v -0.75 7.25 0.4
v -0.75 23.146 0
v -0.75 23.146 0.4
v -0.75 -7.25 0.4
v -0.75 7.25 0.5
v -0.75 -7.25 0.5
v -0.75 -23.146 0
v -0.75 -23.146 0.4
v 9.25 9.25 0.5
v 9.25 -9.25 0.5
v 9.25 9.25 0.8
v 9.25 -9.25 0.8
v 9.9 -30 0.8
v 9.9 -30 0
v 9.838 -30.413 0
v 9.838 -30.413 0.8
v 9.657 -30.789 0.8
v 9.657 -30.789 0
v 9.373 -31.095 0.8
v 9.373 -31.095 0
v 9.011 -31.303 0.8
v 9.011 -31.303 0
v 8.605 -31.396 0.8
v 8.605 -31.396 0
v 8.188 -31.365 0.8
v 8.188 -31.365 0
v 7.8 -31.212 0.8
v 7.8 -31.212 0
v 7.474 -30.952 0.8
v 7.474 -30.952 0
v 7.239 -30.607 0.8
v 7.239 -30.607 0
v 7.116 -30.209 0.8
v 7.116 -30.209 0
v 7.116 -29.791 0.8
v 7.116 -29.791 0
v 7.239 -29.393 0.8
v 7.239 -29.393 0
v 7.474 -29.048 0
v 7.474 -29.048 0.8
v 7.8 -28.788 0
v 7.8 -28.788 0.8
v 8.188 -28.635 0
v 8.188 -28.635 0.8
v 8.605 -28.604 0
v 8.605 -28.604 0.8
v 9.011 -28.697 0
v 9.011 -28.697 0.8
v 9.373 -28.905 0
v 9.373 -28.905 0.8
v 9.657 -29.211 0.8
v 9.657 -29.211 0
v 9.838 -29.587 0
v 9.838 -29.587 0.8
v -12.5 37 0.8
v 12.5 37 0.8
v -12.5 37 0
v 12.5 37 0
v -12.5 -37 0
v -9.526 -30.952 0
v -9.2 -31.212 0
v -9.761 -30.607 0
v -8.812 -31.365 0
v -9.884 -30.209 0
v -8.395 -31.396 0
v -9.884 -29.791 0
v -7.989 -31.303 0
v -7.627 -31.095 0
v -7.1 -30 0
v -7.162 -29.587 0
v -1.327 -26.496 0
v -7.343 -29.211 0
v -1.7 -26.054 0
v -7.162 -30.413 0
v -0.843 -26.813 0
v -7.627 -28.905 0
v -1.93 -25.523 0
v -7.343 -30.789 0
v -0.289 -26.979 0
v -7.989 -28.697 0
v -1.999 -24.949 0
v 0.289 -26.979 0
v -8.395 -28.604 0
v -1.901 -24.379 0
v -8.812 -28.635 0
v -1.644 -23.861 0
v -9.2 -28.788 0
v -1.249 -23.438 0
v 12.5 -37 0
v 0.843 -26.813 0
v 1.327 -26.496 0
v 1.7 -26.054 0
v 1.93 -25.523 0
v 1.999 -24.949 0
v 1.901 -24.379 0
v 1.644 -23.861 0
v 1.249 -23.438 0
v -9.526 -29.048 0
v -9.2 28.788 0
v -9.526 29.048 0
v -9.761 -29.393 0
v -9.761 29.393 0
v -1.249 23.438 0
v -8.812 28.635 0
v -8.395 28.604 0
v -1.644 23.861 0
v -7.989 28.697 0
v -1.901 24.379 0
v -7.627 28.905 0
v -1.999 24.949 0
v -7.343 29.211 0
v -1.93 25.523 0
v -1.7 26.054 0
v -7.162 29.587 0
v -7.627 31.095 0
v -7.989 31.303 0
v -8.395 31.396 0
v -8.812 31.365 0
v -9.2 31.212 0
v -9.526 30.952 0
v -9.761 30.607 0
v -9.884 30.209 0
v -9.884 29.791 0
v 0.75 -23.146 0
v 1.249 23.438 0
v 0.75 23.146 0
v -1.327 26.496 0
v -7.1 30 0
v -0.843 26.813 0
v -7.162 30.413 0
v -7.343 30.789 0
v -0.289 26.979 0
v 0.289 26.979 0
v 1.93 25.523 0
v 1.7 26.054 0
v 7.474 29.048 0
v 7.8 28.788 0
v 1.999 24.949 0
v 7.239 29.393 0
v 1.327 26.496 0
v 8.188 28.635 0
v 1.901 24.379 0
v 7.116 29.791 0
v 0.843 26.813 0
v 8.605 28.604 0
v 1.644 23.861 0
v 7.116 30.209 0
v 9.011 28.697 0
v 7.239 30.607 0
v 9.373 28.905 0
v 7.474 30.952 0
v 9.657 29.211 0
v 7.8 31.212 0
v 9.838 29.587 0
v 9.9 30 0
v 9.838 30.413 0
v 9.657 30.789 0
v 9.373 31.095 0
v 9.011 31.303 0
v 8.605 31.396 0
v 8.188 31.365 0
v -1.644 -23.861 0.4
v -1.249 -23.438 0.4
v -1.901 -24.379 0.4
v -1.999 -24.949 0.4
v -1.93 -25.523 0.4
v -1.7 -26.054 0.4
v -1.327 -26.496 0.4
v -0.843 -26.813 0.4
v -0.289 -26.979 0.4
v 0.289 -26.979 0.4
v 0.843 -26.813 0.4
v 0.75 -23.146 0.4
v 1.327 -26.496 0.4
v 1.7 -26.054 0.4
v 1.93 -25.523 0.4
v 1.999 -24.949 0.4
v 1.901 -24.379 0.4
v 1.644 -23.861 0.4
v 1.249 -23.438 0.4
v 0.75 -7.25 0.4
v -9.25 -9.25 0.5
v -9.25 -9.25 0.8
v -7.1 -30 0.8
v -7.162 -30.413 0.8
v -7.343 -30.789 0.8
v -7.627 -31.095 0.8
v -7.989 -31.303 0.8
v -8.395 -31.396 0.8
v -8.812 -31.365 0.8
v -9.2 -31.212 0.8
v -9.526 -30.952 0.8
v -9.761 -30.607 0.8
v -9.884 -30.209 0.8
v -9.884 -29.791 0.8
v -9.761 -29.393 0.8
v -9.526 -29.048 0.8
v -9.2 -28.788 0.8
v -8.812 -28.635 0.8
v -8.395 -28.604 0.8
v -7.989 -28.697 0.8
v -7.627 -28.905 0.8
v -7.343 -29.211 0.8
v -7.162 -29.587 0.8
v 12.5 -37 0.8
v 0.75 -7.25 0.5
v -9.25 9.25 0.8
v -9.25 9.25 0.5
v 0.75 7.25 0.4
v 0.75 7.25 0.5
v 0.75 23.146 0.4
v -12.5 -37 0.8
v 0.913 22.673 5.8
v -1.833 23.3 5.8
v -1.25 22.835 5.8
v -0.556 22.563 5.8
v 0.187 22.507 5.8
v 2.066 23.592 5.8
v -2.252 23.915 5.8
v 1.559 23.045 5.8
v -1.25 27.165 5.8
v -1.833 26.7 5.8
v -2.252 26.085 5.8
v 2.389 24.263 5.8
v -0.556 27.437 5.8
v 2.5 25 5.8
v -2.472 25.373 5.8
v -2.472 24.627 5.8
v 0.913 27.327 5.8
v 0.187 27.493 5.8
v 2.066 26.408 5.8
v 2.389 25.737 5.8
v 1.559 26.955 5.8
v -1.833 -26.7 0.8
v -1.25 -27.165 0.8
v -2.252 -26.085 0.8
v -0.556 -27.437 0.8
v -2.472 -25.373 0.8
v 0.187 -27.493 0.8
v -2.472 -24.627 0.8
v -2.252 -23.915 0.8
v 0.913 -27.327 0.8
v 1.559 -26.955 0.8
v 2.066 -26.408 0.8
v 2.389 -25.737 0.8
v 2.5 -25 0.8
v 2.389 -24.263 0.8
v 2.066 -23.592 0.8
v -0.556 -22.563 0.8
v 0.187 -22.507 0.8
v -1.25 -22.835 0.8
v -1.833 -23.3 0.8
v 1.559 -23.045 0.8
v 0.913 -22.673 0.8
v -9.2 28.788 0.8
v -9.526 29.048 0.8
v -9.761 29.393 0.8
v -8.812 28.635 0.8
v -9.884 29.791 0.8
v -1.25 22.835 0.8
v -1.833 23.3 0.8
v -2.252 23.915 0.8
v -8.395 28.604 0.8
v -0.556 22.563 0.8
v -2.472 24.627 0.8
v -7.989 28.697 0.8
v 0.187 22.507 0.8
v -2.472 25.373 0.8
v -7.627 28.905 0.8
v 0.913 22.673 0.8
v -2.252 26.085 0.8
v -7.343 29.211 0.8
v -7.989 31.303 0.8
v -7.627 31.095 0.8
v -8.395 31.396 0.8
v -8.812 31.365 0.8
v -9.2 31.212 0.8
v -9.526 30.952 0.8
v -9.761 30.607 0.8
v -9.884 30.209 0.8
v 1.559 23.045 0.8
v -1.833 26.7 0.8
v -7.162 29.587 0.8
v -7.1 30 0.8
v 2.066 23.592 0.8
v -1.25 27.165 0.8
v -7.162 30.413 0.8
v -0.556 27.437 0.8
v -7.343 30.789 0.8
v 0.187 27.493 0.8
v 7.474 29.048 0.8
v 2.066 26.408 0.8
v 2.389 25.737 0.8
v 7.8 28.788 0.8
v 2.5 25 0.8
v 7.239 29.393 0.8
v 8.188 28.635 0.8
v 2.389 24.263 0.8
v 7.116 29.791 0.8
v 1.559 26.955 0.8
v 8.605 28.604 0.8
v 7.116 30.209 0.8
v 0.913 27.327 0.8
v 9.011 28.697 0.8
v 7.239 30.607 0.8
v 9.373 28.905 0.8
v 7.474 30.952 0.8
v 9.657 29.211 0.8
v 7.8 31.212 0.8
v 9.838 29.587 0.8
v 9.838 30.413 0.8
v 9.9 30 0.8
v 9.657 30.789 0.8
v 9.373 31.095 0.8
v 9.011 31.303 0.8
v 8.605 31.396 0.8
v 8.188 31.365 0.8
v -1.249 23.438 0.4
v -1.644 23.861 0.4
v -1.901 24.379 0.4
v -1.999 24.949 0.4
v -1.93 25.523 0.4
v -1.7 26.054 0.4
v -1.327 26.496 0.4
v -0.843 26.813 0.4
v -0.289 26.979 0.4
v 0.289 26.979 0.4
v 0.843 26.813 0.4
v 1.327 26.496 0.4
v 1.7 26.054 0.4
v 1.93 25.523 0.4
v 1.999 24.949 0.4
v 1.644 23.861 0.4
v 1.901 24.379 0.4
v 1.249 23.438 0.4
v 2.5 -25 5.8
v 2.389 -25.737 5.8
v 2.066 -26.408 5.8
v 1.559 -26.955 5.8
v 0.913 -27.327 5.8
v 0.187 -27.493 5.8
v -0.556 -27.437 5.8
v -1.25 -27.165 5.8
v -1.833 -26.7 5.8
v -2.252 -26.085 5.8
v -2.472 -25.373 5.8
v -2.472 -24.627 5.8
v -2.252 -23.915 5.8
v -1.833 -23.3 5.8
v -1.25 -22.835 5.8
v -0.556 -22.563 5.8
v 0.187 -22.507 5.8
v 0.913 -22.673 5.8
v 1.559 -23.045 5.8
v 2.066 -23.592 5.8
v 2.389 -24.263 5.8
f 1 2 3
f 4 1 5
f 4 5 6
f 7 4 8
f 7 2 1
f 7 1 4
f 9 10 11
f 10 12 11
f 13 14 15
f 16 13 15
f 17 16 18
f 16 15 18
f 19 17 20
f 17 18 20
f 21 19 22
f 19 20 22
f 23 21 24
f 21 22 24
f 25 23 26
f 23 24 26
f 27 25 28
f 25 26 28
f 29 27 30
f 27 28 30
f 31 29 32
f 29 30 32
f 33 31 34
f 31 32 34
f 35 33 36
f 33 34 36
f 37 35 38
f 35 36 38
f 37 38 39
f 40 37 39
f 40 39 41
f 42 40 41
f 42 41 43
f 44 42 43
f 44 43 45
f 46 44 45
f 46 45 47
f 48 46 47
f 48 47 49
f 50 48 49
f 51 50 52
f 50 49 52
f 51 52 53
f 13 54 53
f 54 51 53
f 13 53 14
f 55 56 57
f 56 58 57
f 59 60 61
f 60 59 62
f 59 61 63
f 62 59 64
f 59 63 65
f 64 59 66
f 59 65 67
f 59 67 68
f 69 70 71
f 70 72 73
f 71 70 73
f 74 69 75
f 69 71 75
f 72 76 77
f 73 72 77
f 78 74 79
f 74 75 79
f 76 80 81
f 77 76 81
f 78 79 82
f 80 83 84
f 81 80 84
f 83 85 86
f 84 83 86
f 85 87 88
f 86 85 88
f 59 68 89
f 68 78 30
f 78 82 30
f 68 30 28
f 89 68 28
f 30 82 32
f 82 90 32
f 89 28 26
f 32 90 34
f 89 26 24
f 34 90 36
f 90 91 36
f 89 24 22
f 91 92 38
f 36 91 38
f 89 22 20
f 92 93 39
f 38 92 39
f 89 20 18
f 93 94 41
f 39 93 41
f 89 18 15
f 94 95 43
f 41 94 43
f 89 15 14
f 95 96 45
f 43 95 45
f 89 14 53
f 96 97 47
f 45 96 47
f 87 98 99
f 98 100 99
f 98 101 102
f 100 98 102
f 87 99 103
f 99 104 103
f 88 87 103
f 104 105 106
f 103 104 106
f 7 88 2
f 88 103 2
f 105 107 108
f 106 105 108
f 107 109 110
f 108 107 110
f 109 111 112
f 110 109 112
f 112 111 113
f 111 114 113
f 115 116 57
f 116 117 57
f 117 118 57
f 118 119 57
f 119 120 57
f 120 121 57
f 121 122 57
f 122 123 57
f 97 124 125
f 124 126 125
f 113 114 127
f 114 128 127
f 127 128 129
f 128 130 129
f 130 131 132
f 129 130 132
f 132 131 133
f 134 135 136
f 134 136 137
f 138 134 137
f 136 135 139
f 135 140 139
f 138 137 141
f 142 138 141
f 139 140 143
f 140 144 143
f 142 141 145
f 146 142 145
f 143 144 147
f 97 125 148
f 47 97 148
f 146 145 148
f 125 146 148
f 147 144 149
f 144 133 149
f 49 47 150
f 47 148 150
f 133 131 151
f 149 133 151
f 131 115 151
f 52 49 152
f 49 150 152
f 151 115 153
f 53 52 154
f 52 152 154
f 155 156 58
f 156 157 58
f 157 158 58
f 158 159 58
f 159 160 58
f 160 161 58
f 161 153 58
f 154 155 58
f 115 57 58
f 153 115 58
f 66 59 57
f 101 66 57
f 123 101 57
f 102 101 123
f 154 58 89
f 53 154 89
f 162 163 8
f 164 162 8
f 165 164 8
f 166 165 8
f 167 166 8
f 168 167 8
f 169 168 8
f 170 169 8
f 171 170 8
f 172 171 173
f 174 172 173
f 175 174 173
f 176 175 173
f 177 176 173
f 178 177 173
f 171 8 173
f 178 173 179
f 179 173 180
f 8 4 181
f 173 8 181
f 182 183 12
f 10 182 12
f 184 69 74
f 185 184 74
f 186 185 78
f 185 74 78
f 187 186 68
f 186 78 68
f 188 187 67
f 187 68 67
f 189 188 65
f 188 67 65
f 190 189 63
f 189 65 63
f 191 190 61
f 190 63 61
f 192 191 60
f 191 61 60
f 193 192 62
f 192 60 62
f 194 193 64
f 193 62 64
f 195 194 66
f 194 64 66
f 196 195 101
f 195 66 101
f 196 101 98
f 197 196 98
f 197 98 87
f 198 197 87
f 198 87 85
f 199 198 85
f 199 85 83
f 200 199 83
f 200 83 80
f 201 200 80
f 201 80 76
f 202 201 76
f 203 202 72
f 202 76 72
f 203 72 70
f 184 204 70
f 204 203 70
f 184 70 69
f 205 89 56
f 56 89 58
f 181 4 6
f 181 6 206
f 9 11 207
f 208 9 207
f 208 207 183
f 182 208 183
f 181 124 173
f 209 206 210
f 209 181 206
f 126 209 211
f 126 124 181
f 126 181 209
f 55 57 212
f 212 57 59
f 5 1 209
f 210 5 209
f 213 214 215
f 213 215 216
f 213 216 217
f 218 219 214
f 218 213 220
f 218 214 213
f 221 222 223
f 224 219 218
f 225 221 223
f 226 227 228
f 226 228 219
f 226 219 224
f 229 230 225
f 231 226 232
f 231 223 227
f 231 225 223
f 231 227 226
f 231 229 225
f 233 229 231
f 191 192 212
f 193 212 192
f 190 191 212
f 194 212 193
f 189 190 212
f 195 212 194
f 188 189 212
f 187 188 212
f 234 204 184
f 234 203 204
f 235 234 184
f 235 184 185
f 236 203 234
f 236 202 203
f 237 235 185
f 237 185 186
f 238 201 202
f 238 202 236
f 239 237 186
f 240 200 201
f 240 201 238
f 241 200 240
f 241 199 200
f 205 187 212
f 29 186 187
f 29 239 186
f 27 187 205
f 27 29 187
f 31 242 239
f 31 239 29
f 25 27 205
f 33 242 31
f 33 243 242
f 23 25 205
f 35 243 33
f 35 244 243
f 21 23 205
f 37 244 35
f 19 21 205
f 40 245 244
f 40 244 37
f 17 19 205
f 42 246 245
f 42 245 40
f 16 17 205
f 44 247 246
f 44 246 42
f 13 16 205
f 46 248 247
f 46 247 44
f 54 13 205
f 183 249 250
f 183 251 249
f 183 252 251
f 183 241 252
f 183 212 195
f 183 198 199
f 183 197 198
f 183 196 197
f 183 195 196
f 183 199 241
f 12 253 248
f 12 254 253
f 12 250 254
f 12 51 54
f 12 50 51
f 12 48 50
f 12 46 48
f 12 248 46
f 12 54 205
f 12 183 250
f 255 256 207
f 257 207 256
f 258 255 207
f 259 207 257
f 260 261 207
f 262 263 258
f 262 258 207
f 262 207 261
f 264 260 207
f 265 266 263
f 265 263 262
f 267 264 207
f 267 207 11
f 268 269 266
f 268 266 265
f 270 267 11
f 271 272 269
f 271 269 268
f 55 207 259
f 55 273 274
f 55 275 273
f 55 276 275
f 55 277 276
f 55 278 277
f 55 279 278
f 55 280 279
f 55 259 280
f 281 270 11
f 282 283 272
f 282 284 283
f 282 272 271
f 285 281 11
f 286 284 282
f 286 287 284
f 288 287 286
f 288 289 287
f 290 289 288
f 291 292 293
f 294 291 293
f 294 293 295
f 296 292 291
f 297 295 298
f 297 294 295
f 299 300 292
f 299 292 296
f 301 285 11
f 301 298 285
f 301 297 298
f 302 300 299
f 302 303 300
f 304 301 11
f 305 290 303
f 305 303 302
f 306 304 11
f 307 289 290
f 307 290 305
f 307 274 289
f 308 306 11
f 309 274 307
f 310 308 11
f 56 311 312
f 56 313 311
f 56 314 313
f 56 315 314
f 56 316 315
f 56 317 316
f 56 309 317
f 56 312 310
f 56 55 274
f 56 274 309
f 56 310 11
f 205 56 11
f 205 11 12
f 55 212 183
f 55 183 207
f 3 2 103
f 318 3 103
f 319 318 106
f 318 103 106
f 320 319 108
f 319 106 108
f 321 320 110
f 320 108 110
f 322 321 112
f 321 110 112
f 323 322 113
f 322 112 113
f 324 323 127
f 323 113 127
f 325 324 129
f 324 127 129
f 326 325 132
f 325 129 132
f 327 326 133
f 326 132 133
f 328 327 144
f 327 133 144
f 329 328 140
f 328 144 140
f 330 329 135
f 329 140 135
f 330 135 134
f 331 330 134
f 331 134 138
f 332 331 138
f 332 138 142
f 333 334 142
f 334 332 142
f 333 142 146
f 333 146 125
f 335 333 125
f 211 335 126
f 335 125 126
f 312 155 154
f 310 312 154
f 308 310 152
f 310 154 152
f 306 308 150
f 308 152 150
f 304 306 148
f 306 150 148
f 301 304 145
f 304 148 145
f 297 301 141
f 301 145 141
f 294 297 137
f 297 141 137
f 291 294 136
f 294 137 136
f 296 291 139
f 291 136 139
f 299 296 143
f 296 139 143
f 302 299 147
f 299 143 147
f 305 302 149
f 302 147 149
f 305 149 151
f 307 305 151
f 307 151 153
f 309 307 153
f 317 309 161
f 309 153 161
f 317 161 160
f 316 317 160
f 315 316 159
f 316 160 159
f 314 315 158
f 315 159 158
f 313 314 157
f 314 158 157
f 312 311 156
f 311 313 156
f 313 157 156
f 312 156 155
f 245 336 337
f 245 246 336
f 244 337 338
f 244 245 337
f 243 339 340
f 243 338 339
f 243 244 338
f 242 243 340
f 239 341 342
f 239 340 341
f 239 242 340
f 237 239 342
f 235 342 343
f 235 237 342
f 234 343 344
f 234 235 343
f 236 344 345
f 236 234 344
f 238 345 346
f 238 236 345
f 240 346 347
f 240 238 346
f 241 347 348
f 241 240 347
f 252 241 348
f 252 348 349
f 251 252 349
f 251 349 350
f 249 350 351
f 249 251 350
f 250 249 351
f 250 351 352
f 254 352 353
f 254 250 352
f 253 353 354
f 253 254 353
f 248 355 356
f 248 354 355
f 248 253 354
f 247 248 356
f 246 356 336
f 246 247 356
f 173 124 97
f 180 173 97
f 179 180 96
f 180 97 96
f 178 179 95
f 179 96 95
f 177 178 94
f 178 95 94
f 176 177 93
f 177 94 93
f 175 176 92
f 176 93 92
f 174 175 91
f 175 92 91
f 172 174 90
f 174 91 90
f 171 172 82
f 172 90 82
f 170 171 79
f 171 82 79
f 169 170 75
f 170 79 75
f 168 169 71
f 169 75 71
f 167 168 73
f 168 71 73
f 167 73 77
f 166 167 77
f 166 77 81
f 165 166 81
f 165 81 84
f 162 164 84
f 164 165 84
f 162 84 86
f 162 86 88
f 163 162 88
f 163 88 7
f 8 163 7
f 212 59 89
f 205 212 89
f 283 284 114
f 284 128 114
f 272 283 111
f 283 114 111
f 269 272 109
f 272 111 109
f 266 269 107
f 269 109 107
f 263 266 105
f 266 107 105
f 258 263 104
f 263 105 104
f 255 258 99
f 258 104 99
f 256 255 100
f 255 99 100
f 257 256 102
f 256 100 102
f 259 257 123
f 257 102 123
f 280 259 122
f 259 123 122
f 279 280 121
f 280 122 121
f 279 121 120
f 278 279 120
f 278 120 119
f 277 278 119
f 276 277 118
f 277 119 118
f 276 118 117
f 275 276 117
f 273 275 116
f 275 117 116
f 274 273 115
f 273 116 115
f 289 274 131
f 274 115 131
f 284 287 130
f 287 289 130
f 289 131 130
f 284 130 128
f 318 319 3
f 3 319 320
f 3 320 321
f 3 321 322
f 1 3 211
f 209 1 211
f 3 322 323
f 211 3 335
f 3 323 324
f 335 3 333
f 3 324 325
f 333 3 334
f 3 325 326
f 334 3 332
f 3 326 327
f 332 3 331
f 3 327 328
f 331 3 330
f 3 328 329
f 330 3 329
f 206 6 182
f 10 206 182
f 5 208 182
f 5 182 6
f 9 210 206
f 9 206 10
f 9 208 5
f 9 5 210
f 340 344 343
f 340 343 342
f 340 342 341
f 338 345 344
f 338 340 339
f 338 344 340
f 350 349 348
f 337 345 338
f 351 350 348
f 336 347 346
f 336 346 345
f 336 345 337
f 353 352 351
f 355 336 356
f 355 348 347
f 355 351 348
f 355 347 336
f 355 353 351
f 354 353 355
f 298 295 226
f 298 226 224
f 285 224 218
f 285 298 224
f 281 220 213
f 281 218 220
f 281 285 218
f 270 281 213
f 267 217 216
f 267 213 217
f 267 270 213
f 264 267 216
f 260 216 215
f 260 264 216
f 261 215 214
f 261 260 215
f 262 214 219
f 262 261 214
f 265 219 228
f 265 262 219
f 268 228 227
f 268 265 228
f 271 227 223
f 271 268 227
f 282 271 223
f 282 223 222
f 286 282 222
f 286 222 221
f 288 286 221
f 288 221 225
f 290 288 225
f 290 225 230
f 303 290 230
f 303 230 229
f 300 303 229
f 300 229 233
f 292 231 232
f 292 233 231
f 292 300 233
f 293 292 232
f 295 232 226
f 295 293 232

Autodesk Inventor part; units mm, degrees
ref_plane "YZ Plane" through (0, 0, 0) normal (1, 0, 0) x (0, 1, 0)
ref_plane "XZ Plane" through (0, 0, 0) normal (0, 1, 0) x (-1, 0, 0)
ref_plane "XY Plane" through (0, 0, 0) normal (0, 0, 1) x (1, 0, 0)
ref_plane "Arbeitsebene1" through (0, 0, 0) normal (0, 0, 1) x (1, 0, 0)
sketch "Skizze1" plane through (0, 0, 0) normal (0, 0, 1) x (1, 0, 0)
  line L0 (-12.5, 37) -> (-12.5, -37) projected
  line L1 (-12.5, -37) -> (12.5, -37) projected
  line L2 (12.5, -37) -> (12.5, 37) projected
  line L3 (12.5, 37) -> (-12.5, 37) projected
  circle A0 centre (8.5, 30) radius 1.4 projected
  circle A1 centre (-8.5, 30) radius 1.4 projected
  circle A2 centre (-8.5, -30) radius 1.4 projected
  circle A3 centre (8.5, -30) radius 1.4 projected
  line L4 (9.25, 9.25) -> (9.25, -9.25) projected
  line L5 (9.25, -9.25) -> (-9.25, -9.25) projected
  line L6 (-9.25, -9.25) -> (-9.25, 9.25) projected
  line L7 (-9.25, 9.25) -> (9.25, 9.25) projected
  arc A4 (0.75, 23.146) -> (-0.75, 23.146) centre (0, 25) ccw projected
  line L8 (0.75, -23.146) -> (0.75, 23.146) projected
  arc A5 (-0.75, -23.146) -> (0.75, -23.146) centre (0, -25) ccw projected
  line L9 (-0.75, 23.146) -> (-0.75, -23.146) projected
  point P0 (0, 0)
extrude "Extrusion1" add sketch "Skizze1" along normal blind 0.4 contours L3 L2 L1 L0 | L4 L5 L8 L7 | L9 L5 L6 L7
sketch "Skizze2" plane through (0, 0, 0.4) normal (0, 0, 1) x (1, 0, 0)
  arc A0 (0.75, 23.146) -> (-0.75, 23.146) centre (0, 25) ccw projected
  line L0 (-12.5, -37) -> (12.5, -37) projected
  line L1 (12.5, -37) -> (12.5, 37) projected
  line L2 (12.5, 37) -> (-12.5, 37) projected
  line L3 (-12.5, 37) -> (-12.5, -37) projected
  circle A1 centre (8.5, -30) radius 1.4 projected
  circle A2 centre (-8.5, -30) radius 1.4 projected
  circle A3 centre (-8.5, 30) radius 1.4 projected
  circle A4 centre (8.5, 30) radius 1.4 projected
  line L4 (0.75, 23.146) -> (0.75, -23.146) projected
  arc A5 (-0.75, -23.146) -> (0.75, -23.146) centre (0, -25) ccw projected
  line L5 (-0.75, -23.146) -> (-0.75, 23.146) projected
  arc A6 (0.75, 23.146) -> (-0.75, 23.146) centre (0, 25) ccw projected
  circle A7 centre (0, 25) radius 2.5
  line L6 (-9.25, 9.25) -> (9.25, 9.25) projected
  line L7 (9.25, -9.25) -> (-9.25, -9.25) projected
  line L8 (0.75, 23.146) -> (0.75, -23.146) projected
  line L9 (0.75, 22.6152) -> (-0.75, 22.6152)
  line L10 (-0.75, 22.6152) -> (-0.75, 9.25)
  line L11 (-0.75, 9.25) -> (0.75, 9.25)
  line L12 (0.75, 9.25) -> (0.75, 22.6152)
  line L13 (-0.75, -23.146) -> (-0.75, 23.146) projected
  line L14 (0.75, -9.25) -> (-0.75, -9.25)
  line L15 (-0.75, -9.25) -> (-0.75, -23.146)
  line L16 (-0.75, -23.146) -> (0.75, -23.146)
  line L17 (0.75, -23.146) -> (0.75, -9.25)
  arc A8 (-0.75, -23.146) -> (0.75, -23.146) centre (0, -25) ccw projected
  circle A9 centre (0, -25) radius 2.5
  line L18 (0.75, 9.25) -> (-0.75, 9.25)
  line L19 (-0.75, 9.25) -> (-0.75, 7.25)
  line L20 (-0.75, 7.25) -> (0.75, 7.25)
  line L21 (0.75, 7.25) -> (0.75, 9.25)
  line L22 (0.75, -9.25) -> (-0.75, -9.25)
  line L23 (-0.75, -9.25) -> (-0.75, -7.25)
  line L24 (-0.75, -7.25) -> (0.75, -7.25)
  line L25 (0.75, -7.25) -> (0.75, -9.25)
  point P0 (0, 0)
  point P1 (0.75, -9.25)
  point P2 (0.75, 9.25)
  point P3 (0.75, -7.25)
  dimension "d2" = 5
  dimension "d11" = 1.5
  dimension "d12" = 2
  dimension "d13" = 2
extrude "Extrusion2" add sketch "Skizze2" along normal blind 0.4 contours L4 L9 L5 A0 | A0 L5 A7 L4 | L4 L6 L5 A7 | A7 L9 | L4 L20 L5 L6 | L4 L7 L5 L24 | L4 A9 L5 L7 | A9 L5 A5 L4 | L4 L16 L5 A9 | A5 L16 | L3 L2 L1 L0
sketch "Skizze3" plane through (0, 0, 0.8) normal (0, 0, 1) x (1, 0, 0)
  arc A0 (0.75, 23.146) -> (-0.75, 23.146) centre (0, 25) ccw projected
  arc A1 (-0.75, -23.146) -> (0.75, -23.146) centre (0, -25) ccw projected
  arc A2 (0.75, 23.146) -> (-0.75, 23.146) centre (0, 25) ccw projected
  circle A3 centre (0, 25) radius 2.5
  circle A4 centre (0, -25) radius 2.5
  point P0 (0, 0)
  dimension "d5" = 5
  dimension "d6" = 5
extrude "Extrusion3" add sketch "Skizze3" along normal blind 5
sketch "Skizze4" plane through (0, 0, 0.8) normal (0, 0, 1) x (1, 0, 0)
  circle A0 centre (0, -25) radius 2.5 projected
  circle A1 centre (0, 25) radius 2.5 projected
  line L0 (12.5, -37) -> (12.5, 37) projected
  line L1 (12.5, 37) -> (-12.5, 37) projected
  line L2 (-12.5, 37) -> (-12.5, -37) projected
  line L3 (-12.5, -37) -> (12.5, -37) projected
  line L4 (-0.75, -7.25) -> (-0.75, 7.25) projected
  line L5 (0.75, 7.25) -> (0.75, -7.25) projected
  circle A2 centre (8.5, -30) radius 1.4 projected
  circle A3 centre (-8.5, -30) radius 1.4 projected
  circle A4 centre (-8.5, 30) radius 1.4 projected
  circle A5 centre (8.5, 30) radius 1.4 projected
  line L6 (-9.25, -9.25) -> (9.25, -9.25)
  line L7 (9.25, -9.25) -> (9.25, 9.25)
  line L8 (9.25, 9.25) -> (-9.25, 9.25)
  line L9 (-9.25, 9.25) -> (-9.25, -9.25)
  line L10 (-9.25, -9.25) -> (9.25, 9.25) construction
  line L11 (9.25, -9.25) -> (-9.25, 9.25) construction
  line L12 (0.75, -7.25) -> (-0.75, -7.25) projected
  line L13 (-0.75, 7.25) -> (0.75, 7.25) projected
  point P0 (0, 0)
  dimension "d9" = 18.5
  dimension "d10" = 18.5
extrude "Extrusion4" cut sketch "Skizze4" against normal blind 0.3 contours L9 L8 L7 L6
equation "\"d7\" = d6"
properties part number "40_microfluidic_chip_lightsheet_layer1_negative_v0"
